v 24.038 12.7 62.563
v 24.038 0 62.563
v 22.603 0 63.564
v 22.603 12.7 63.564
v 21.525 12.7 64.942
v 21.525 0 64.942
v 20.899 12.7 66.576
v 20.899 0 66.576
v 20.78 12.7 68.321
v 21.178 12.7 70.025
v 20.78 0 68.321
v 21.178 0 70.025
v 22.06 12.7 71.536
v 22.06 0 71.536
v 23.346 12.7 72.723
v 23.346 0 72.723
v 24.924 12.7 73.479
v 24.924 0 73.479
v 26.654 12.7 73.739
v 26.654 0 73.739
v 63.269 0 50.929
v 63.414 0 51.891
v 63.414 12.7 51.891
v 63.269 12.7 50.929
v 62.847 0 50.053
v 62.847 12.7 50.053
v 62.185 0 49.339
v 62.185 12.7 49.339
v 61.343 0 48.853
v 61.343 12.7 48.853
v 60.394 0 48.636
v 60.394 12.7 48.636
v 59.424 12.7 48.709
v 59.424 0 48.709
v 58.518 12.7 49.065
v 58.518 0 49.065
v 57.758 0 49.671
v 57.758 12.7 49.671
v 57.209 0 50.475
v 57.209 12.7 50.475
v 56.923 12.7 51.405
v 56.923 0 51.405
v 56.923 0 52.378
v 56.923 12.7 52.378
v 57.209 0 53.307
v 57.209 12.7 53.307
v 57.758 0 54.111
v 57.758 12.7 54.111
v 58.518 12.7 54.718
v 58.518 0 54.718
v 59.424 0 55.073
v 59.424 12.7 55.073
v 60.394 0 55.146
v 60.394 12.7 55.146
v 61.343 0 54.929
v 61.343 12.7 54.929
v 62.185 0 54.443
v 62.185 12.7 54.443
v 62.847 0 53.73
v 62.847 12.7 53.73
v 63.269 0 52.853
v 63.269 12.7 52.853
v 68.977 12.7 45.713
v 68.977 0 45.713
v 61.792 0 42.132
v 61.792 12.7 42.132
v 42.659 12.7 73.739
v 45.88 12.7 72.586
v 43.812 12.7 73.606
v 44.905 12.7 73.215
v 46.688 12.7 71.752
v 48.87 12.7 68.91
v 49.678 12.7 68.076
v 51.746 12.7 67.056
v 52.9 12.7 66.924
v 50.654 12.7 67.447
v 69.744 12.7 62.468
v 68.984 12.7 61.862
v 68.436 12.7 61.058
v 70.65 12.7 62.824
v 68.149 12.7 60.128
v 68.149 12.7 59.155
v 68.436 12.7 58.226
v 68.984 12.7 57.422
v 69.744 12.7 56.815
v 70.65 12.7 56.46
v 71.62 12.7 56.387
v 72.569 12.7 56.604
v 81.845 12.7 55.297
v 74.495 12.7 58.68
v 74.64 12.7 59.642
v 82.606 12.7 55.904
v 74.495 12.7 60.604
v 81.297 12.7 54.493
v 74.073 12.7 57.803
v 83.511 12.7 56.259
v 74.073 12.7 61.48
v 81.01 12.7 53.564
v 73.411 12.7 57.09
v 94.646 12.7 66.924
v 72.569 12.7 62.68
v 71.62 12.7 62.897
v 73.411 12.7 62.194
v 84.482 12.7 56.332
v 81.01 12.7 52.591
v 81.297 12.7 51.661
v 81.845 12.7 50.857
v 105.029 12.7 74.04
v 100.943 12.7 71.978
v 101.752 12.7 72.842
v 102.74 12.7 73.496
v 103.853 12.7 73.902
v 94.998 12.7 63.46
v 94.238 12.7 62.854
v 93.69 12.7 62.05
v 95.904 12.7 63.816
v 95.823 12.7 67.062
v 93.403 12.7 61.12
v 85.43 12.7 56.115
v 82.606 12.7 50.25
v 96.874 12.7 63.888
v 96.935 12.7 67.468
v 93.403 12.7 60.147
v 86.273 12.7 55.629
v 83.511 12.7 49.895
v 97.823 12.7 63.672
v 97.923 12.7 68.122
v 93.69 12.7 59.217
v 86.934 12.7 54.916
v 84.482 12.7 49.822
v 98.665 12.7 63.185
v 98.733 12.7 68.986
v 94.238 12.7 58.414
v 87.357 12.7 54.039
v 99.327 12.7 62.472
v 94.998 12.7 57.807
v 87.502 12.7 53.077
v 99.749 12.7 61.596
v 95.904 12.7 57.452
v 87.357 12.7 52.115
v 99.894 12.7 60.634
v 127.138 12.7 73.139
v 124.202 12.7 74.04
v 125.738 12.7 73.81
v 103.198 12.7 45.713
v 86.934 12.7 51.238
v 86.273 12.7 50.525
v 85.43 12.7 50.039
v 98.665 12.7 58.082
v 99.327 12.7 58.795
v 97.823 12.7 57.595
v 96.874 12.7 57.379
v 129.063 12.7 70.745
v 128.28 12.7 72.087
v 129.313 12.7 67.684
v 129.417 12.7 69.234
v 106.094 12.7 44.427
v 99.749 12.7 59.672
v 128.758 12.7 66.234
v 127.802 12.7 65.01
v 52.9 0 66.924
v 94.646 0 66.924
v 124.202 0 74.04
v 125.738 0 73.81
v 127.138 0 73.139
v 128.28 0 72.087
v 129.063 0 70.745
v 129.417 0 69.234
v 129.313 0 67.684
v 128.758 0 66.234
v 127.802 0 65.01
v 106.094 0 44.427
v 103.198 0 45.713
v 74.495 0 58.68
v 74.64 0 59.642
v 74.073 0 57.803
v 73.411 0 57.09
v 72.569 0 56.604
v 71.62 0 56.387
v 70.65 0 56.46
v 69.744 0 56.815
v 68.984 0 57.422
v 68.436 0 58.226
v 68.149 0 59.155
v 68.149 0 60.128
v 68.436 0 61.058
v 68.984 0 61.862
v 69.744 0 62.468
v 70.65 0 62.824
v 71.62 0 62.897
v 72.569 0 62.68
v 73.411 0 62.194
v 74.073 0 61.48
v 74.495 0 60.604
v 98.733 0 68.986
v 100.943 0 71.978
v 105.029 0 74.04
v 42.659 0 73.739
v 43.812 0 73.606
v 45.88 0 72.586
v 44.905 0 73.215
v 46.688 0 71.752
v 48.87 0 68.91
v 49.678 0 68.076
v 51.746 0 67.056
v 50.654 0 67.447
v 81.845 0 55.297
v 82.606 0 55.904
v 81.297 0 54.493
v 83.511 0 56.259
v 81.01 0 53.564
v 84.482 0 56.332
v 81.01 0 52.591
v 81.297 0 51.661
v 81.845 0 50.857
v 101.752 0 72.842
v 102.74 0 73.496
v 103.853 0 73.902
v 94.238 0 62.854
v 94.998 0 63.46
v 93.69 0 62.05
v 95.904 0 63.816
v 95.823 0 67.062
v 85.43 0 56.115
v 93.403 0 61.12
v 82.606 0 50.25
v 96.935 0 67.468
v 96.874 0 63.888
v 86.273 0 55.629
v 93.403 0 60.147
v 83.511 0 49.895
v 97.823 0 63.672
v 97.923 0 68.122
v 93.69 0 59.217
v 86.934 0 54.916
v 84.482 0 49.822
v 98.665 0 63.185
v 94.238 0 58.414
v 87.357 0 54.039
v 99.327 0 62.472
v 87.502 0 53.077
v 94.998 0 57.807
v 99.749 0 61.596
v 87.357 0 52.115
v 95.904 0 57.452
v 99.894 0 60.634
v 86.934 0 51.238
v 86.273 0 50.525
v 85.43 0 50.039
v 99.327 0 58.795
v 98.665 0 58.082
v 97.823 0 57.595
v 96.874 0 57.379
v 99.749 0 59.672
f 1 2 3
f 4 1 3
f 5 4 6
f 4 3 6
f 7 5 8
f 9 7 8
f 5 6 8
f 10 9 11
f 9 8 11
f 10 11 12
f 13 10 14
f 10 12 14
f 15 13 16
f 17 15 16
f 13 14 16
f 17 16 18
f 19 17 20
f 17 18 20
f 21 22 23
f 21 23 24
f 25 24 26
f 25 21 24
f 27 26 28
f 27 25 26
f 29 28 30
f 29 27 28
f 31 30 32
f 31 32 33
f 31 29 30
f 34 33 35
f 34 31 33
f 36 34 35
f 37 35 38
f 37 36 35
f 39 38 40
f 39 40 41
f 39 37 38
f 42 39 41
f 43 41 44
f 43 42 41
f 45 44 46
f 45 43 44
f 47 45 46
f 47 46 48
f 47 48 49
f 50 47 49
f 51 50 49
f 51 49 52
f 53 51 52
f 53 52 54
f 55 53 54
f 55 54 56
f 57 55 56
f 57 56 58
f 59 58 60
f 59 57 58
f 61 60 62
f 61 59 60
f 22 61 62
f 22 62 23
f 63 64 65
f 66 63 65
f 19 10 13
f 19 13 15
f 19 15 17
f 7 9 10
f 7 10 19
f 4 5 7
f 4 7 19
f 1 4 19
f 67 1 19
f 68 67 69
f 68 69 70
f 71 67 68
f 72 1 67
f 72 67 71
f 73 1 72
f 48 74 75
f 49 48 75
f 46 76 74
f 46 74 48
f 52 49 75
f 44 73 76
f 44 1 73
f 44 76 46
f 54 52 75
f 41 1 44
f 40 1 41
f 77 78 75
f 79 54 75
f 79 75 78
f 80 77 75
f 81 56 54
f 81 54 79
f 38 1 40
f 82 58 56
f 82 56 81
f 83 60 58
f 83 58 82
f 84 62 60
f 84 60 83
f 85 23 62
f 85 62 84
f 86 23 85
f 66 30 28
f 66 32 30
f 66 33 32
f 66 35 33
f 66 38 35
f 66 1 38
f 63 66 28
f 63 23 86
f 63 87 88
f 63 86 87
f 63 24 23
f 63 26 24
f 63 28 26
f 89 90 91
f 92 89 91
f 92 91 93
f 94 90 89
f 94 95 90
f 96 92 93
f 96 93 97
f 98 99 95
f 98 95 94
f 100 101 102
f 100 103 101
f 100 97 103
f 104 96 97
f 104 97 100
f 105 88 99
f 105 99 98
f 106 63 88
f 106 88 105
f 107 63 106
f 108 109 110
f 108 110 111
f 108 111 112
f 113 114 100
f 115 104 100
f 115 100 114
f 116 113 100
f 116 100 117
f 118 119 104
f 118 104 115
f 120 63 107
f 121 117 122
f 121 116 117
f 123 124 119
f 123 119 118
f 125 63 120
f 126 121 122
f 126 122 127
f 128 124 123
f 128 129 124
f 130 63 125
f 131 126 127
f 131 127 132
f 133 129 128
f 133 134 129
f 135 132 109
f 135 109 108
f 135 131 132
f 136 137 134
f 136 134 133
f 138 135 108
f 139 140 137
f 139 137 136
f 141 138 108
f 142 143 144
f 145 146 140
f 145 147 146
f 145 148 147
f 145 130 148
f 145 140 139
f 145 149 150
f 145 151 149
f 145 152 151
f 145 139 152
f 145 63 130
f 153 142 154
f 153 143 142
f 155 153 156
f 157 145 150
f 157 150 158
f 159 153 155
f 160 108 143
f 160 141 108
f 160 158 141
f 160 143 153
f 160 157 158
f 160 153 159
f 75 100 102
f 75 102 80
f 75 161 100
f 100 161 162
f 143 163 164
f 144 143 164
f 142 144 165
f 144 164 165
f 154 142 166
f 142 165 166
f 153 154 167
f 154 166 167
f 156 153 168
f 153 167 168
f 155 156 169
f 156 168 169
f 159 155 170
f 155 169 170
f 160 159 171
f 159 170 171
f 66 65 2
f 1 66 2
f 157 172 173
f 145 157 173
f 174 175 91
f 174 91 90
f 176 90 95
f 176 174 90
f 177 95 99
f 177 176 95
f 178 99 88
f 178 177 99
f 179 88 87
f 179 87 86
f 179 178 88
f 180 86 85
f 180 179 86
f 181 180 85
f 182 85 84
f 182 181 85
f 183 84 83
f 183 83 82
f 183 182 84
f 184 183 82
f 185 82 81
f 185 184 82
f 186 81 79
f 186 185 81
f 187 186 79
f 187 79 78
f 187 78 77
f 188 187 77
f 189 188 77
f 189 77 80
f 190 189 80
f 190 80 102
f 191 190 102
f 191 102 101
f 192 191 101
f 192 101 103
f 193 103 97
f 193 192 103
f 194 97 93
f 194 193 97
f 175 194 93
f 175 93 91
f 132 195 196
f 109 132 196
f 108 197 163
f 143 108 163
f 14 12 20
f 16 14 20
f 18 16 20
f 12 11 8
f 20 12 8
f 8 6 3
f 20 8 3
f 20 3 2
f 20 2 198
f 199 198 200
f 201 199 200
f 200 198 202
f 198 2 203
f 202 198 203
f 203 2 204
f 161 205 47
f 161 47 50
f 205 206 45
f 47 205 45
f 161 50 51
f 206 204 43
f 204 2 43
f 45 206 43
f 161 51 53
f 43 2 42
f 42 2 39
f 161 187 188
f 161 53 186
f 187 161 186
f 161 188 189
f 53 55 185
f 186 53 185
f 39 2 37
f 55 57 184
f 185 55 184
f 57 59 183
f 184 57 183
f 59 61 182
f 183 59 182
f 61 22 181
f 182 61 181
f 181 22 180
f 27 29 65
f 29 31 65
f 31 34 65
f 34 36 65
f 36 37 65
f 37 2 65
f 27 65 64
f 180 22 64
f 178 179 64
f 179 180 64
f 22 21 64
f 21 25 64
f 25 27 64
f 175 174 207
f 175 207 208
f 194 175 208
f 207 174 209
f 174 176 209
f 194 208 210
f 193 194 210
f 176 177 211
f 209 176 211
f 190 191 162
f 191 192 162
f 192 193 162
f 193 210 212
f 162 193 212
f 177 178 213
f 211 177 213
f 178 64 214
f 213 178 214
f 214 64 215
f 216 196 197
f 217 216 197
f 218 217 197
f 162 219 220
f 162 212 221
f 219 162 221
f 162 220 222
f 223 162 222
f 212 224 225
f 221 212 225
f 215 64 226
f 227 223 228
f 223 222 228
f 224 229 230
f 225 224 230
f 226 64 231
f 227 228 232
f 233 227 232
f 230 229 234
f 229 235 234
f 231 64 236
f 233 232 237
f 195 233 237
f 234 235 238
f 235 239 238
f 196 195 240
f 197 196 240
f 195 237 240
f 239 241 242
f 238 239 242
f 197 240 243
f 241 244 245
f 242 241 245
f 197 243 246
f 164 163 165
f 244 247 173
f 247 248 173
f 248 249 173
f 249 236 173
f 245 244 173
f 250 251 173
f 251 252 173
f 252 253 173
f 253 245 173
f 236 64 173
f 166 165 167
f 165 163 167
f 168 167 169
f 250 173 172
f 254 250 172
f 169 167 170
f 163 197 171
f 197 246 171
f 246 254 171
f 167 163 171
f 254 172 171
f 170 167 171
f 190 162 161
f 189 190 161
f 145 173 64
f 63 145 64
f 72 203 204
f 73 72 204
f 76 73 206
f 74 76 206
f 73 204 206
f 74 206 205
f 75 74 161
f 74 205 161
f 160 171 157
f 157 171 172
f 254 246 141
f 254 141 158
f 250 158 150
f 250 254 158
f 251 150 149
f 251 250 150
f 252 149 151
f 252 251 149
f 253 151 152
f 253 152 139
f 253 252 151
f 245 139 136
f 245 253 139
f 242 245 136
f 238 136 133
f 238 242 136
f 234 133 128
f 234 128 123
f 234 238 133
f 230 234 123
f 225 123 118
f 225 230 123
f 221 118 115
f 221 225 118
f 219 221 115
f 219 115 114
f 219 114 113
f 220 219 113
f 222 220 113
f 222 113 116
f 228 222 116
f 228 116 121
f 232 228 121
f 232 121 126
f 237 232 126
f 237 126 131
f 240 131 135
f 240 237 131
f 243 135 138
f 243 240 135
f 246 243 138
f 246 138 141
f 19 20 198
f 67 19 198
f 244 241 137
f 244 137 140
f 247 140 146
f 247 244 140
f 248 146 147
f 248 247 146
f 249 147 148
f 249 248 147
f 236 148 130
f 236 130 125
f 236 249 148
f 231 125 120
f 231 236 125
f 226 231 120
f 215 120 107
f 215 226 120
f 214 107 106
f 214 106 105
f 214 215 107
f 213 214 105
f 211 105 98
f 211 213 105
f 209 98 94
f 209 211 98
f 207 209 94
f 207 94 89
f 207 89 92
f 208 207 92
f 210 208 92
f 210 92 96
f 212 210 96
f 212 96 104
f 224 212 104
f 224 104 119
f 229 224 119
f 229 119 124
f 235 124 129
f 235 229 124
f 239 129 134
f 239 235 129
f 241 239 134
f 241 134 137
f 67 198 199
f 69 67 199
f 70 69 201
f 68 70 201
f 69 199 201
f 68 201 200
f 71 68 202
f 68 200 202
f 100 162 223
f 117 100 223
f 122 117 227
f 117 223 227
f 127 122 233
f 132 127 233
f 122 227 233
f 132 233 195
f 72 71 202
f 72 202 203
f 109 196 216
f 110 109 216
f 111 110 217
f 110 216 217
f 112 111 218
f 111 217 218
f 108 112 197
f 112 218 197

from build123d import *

# Parameters (mm, degrees)
SKETCH1_R           = 3.2639
BOSS_EXTRUDE1_DEPTH = 12.7


with BuildPart() as part:
    # Sketch1 → Boss-Extrude1 (new body)
    with BuildSketch(Plane(origin=(0, 0, 0), x_dir=(1, 0, 0), z_dir=(0, 1, 0))):
        with BuildLine():
            Line((98.733031573, -68.985835228), (100.942599672, -71.978006872))
            ThreePointArc((100.942599672, -71.978006872), (102.740427245, -73.495514847), (105.029143887, -74.040299732))
            Line((105.029143887, -74.040299732), (124.201892168, -74.040299732))
            ThreePointArc((124.201892168, -74.040299732), (129.062693158, -70.745465469), (127.802444272, -65.010041176))
            Line((127.802444272, -65.010041176), (106.094318665, -44.426787292))
            Line((106.094318665, -44.426787292), (103.19820861, -45.713487798))
            Line((103.19820861, -45.713487798), (68.977352979, -45.713487798))
            Line((68.977352979, -45.713487798), (61.792374607, -42.131557151))
            Line((61.792374607, -42.131557151), (24.038270246, -62.563232545))
            ThreePointArc((24.038270246, -62.563232545), (20.915380805, -69.188017292), (26.654079797, -73.738571684))
            Line((26.654079797, -73.738571684), (42.658611745, -73.738571684))
            ThreePointArc((42.658611745, -73.738571684), (44.904764604, -73.215017375), (46.687932027, -71.752271422))
            Line((46.687932027, -71.752271422), (48.870340124, -68.909842629))
            ThreePointArc((48.870340124, -68.909842629), (50.653507547, -67.447096676), (52.899660406, -66.923542367))
            Line((52.899660406, -66.923542367), (94.646487358, -66.923542367))
            ThreePointArc((94.646487358, -66.923542367), (96.935204, -67.468327252), (98.733031573, -68.985835228))
        make_face()
        with Locations((60.150170667, -51.891201826)):
            Circle(SKETCH1_R, mode=Mode.SUBTRACT)
        with Locations((71.3764156, -59.641849895)):
            Circle(SKETCH1_R, mode=Mode.SUBTRACT)
        with Locations((84.237729699, -53.077081169)):
            Circle(SKETCH1_R, mode=Mode.SUBTRACT)
        with Locations((96.63028976, -60.633621731)):
            Circle(SKETCH1_R, mode=Mode.SUBTRACT)
    extrude(amount=BOSS_EXTRUDE1_DEPTH)


solid = part.part
